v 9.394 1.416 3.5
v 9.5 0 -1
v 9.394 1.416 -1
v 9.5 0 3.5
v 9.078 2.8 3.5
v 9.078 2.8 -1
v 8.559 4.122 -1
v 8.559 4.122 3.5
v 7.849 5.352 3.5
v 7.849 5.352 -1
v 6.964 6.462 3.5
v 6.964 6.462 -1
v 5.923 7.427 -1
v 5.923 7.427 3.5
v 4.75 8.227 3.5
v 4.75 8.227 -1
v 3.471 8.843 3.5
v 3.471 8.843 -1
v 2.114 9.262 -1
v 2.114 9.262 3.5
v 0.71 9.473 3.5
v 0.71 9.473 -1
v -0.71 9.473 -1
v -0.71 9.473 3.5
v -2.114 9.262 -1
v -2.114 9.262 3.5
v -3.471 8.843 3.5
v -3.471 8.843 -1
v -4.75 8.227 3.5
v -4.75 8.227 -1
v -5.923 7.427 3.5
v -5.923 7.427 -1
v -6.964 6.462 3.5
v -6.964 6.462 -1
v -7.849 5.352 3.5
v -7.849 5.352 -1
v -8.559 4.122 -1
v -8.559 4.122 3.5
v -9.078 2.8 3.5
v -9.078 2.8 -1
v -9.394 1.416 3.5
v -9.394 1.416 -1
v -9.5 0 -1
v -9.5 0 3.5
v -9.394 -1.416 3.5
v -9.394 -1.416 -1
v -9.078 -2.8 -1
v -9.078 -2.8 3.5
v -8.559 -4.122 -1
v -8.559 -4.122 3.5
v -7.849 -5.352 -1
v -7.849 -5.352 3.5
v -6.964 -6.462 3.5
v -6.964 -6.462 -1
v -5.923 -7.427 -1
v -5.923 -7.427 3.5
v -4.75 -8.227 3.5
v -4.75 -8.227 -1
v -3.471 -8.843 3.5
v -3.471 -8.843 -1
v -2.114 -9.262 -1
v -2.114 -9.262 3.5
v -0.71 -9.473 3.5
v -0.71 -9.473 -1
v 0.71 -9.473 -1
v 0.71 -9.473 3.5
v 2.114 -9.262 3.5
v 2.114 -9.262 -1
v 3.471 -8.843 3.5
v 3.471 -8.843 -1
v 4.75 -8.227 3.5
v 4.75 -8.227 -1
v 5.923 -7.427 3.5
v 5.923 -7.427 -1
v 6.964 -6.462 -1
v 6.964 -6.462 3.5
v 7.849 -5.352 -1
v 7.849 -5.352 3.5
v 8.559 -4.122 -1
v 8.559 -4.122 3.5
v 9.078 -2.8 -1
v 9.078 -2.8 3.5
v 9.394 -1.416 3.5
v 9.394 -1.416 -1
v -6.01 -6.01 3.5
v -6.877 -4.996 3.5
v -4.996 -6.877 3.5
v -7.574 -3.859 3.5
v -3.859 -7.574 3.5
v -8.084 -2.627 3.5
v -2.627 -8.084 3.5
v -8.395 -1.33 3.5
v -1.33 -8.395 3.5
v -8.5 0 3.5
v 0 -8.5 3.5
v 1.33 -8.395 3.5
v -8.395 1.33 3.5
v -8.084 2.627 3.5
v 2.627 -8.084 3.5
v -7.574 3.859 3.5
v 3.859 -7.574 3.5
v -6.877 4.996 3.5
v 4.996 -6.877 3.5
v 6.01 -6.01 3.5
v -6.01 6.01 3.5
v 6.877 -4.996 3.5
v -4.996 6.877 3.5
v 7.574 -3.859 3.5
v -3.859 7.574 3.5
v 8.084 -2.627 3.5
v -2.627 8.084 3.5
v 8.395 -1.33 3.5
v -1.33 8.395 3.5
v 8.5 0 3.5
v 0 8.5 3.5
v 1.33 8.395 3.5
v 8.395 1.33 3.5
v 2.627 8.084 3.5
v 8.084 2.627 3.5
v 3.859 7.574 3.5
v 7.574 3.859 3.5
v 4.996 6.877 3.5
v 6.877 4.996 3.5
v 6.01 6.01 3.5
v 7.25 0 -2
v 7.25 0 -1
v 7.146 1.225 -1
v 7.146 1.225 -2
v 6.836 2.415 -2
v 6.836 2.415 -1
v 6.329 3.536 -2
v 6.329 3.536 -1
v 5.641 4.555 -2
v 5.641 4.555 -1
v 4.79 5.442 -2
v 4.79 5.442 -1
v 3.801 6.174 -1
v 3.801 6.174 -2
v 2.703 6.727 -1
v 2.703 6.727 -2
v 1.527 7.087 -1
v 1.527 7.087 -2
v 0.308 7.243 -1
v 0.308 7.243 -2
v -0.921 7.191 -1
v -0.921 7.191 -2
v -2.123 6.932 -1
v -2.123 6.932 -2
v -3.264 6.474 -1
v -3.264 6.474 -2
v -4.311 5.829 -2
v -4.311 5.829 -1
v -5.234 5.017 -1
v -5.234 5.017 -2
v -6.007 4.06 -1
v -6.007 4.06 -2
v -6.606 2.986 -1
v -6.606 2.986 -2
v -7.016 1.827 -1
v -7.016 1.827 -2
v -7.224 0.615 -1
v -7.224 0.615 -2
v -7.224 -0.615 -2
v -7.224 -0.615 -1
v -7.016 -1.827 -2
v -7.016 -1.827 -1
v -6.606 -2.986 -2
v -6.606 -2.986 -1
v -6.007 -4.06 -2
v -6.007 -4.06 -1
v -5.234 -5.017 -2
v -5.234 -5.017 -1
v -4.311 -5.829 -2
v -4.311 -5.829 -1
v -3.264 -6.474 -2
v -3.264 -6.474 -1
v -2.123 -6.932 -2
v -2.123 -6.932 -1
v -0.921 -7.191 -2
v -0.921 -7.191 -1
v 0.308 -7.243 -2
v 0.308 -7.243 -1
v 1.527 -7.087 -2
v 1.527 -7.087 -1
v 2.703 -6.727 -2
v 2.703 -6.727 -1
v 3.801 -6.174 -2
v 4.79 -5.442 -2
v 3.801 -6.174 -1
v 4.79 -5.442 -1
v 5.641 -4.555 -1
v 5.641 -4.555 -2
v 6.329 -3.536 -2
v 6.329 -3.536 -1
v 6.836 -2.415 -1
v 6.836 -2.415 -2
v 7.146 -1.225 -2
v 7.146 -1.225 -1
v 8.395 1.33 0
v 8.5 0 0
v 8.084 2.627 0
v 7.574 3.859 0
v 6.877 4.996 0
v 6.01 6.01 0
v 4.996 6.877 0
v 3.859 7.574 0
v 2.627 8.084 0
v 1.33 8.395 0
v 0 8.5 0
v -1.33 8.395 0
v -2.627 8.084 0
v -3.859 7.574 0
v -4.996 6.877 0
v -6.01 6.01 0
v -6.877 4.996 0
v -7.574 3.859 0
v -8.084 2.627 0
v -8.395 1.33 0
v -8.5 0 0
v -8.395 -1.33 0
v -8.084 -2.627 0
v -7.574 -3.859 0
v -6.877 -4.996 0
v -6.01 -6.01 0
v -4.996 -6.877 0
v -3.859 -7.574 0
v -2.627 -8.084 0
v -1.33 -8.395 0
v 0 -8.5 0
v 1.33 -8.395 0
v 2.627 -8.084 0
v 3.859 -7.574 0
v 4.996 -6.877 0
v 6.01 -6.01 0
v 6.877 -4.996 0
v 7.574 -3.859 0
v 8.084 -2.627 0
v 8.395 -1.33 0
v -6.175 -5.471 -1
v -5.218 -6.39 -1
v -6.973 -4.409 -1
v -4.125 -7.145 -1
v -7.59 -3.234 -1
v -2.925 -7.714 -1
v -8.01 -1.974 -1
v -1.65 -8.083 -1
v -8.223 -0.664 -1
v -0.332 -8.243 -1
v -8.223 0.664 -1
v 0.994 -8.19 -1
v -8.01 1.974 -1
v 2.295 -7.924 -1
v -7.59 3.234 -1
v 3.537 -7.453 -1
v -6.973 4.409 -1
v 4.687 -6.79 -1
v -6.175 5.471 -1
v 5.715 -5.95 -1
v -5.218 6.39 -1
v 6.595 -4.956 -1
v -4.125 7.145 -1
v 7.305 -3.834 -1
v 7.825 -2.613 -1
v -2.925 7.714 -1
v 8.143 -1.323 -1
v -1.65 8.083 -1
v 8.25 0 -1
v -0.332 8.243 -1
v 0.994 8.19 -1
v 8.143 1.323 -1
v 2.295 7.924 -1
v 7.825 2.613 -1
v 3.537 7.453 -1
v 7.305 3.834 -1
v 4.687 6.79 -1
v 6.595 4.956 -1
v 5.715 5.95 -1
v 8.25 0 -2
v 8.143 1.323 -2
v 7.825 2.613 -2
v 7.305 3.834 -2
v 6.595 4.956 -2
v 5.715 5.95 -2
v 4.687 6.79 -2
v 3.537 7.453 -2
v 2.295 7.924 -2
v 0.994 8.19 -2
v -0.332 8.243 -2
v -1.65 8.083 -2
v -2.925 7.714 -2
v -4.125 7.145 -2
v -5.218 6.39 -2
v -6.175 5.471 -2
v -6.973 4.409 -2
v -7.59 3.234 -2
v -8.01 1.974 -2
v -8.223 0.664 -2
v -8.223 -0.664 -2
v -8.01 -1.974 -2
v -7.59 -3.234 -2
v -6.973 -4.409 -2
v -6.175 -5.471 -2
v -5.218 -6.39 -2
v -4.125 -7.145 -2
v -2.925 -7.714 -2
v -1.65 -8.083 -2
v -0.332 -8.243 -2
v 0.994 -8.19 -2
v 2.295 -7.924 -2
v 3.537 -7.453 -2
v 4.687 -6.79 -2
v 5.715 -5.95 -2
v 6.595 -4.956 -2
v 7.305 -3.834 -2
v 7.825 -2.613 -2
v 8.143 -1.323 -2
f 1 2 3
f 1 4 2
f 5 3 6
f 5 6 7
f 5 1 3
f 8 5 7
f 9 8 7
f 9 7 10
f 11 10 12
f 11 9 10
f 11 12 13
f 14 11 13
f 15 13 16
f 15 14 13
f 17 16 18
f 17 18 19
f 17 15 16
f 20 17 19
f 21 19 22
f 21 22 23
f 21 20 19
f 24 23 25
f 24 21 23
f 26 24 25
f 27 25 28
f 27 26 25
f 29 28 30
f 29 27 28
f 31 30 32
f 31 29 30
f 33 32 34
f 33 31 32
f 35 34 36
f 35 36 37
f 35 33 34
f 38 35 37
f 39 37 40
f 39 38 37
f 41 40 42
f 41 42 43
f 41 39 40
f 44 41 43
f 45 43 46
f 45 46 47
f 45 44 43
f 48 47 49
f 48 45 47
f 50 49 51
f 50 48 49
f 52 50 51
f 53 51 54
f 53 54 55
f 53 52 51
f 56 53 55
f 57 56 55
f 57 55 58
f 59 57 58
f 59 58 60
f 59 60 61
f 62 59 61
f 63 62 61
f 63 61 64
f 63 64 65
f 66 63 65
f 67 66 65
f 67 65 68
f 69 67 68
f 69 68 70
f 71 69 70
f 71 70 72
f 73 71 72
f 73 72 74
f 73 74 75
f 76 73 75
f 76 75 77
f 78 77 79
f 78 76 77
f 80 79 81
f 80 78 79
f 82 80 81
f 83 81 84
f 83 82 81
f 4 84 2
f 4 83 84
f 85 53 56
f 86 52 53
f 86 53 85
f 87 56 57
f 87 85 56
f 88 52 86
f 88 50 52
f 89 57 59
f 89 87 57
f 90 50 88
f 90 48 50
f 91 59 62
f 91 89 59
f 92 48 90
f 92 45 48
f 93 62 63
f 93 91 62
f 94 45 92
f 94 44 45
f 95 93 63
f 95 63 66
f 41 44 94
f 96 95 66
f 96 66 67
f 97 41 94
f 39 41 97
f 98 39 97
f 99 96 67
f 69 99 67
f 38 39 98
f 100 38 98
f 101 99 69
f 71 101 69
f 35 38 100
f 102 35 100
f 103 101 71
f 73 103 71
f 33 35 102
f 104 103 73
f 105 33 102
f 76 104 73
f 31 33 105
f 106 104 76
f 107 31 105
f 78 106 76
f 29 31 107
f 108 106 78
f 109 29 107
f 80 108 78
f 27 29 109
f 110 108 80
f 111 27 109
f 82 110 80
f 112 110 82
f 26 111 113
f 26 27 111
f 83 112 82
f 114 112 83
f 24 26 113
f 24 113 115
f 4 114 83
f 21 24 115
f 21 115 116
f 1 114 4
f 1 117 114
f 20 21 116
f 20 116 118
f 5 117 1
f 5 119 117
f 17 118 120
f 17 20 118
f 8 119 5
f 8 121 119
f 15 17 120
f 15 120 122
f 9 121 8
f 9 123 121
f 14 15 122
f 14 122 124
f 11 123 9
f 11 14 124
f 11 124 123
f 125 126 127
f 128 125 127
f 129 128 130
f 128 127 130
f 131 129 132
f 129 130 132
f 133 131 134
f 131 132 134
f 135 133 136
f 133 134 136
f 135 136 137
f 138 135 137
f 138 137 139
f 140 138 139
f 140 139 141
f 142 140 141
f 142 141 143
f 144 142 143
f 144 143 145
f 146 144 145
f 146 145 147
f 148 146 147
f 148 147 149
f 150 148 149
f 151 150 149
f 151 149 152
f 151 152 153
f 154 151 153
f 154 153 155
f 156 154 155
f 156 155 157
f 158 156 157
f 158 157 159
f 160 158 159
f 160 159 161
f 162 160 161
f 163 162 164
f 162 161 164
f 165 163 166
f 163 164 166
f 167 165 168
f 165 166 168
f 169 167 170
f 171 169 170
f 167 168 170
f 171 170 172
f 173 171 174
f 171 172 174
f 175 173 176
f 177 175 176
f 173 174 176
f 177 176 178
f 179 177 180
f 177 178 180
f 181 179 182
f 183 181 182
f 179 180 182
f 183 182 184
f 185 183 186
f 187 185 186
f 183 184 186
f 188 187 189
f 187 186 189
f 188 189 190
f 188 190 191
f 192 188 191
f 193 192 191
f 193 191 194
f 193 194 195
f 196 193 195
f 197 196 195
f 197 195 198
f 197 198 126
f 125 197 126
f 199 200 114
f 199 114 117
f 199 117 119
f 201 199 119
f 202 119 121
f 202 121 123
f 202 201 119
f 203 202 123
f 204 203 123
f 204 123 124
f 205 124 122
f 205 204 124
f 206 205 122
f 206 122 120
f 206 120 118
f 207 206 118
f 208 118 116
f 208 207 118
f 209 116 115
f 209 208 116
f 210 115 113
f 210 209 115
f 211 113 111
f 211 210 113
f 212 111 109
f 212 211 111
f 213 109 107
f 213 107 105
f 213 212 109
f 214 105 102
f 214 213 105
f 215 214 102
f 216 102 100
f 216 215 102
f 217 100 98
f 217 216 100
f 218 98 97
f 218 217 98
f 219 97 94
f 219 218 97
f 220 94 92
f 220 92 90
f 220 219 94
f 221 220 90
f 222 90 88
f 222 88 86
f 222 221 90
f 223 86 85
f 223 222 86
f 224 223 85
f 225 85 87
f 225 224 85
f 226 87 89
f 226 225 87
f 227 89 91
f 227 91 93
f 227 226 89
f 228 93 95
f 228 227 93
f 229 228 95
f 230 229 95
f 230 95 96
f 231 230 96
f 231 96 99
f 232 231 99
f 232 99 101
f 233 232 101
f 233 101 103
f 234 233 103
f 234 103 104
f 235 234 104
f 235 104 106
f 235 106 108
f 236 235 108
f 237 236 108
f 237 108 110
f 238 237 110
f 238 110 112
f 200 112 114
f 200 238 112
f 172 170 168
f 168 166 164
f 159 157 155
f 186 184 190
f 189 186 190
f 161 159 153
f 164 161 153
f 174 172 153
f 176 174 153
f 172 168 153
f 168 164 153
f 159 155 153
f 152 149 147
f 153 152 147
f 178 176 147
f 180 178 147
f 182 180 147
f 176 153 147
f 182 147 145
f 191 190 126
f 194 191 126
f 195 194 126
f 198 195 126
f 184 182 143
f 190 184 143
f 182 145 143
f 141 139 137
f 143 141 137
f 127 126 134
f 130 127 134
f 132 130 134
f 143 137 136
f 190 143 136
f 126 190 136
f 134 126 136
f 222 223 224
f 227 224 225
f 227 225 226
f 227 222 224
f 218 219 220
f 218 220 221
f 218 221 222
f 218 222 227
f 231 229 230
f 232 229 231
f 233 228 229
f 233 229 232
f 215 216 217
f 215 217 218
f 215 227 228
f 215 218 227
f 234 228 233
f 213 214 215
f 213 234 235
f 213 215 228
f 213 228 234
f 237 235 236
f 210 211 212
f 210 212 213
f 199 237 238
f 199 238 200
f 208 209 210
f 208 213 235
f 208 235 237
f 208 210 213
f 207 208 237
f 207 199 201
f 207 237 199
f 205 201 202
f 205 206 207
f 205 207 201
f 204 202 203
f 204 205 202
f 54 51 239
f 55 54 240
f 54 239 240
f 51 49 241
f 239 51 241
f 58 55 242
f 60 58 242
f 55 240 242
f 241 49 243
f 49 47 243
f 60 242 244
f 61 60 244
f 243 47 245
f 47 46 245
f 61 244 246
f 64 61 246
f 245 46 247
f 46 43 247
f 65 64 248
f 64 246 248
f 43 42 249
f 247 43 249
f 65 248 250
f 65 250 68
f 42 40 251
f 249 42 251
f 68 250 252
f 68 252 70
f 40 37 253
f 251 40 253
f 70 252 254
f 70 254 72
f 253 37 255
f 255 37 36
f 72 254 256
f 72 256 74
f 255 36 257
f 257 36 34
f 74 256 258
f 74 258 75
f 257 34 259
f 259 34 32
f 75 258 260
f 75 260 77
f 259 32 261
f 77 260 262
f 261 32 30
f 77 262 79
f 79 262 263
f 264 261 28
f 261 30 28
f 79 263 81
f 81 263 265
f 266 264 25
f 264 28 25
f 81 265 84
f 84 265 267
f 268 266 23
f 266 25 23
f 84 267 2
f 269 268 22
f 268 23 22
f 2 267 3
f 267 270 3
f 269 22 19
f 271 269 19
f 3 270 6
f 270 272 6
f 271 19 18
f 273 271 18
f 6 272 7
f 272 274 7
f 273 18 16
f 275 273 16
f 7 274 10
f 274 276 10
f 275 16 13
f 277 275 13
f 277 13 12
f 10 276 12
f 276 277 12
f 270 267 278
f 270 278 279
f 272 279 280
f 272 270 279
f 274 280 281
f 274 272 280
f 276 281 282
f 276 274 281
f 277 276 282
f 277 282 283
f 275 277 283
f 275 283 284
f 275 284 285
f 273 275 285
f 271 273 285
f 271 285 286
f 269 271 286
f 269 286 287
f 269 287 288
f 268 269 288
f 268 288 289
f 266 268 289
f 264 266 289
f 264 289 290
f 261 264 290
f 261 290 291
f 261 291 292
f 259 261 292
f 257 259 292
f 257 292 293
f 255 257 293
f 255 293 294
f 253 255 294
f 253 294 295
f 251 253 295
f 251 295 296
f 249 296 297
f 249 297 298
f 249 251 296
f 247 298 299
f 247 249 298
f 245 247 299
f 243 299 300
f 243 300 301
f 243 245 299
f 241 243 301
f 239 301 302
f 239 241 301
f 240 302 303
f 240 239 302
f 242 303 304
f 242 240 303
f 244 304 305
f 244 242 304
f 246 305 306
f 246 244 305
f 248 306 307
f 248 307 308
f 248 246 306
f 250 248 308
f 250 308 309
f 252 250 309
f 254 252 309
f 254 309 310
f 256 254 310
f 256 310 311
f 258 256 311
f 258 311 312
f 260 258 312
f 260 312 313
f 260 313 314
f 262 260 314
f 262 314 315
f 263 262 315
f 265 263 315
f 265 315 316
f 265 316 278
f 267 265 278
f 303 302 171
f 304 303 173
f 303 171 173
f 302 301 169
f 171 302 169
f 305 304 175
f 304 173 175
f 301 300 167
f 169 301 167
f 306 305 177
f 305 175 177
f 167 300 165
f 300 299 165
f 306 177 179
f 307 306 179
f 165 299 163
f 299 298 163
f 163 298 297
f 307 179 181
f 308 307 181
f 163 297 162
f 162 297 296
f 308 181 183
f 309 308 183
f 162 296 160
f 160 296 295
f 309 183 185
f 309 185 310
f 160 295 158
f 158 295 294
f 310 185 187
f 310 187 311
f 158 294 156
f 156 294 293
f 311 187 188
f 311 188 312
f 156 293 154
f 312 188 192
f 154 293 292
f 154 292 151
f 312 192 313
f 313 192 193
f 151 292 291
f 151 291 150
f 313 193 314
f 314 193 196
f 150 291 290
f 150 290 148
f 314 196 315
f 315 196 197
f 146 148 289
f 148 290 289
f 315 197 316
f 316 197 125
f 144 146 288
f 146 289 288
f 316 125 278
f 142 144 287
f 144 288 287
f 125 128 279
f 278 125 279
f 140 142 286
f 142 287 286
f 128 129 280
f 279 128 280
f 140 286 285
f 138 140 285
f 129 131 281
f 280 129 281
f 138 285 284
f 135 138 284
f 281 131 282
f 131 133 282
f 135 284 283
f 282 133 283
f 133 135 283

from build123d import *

# Parameters (mm, degrees)
F0_R     = 9.5
F0_R_2   = 8.5
F1_DEPTH = 3.5
F0_R_3   = 8.25
F0_R_4   = 7.25
F2_DEPTH = 1
F3_DEPTH = 2


with BuildPart() as f1:
    # F0 (on Top) → F1 (new body)
    with BuildSketch(Plane.XY):
        Circle(F0_R)
        Circle(F0_R_2, mode=Mode.SUBTRACT)
    extrude(amount=F1_DEPTH)

    # F0 (on Top) → F2 (join)
    with BuildSketch(Plane.XY):
        Circle(F0_R)
        Circle(F0_R_2, mode=Mode.SUBTRACT)
        Circle(F0_R_2)
        Circle(F0_R_3, mode=Mode.SUBTRACT)
        Circle(F0_R_3)
        Circle(F0_R_4, mode=Mode.SUBTRACT)
        Circle(F0_R_4)
    extrude(amount=-F2_DEPTH)

    # F0 (on Top) → F3 (join)
    with BuildSketch(Plane.XY):
        Circle(F0_R_3)
        Circle(F0_R_4, mode=Mode.SUBTRACT)
    extrude(amount=-F3_DEPTH)


solid = f1.part
